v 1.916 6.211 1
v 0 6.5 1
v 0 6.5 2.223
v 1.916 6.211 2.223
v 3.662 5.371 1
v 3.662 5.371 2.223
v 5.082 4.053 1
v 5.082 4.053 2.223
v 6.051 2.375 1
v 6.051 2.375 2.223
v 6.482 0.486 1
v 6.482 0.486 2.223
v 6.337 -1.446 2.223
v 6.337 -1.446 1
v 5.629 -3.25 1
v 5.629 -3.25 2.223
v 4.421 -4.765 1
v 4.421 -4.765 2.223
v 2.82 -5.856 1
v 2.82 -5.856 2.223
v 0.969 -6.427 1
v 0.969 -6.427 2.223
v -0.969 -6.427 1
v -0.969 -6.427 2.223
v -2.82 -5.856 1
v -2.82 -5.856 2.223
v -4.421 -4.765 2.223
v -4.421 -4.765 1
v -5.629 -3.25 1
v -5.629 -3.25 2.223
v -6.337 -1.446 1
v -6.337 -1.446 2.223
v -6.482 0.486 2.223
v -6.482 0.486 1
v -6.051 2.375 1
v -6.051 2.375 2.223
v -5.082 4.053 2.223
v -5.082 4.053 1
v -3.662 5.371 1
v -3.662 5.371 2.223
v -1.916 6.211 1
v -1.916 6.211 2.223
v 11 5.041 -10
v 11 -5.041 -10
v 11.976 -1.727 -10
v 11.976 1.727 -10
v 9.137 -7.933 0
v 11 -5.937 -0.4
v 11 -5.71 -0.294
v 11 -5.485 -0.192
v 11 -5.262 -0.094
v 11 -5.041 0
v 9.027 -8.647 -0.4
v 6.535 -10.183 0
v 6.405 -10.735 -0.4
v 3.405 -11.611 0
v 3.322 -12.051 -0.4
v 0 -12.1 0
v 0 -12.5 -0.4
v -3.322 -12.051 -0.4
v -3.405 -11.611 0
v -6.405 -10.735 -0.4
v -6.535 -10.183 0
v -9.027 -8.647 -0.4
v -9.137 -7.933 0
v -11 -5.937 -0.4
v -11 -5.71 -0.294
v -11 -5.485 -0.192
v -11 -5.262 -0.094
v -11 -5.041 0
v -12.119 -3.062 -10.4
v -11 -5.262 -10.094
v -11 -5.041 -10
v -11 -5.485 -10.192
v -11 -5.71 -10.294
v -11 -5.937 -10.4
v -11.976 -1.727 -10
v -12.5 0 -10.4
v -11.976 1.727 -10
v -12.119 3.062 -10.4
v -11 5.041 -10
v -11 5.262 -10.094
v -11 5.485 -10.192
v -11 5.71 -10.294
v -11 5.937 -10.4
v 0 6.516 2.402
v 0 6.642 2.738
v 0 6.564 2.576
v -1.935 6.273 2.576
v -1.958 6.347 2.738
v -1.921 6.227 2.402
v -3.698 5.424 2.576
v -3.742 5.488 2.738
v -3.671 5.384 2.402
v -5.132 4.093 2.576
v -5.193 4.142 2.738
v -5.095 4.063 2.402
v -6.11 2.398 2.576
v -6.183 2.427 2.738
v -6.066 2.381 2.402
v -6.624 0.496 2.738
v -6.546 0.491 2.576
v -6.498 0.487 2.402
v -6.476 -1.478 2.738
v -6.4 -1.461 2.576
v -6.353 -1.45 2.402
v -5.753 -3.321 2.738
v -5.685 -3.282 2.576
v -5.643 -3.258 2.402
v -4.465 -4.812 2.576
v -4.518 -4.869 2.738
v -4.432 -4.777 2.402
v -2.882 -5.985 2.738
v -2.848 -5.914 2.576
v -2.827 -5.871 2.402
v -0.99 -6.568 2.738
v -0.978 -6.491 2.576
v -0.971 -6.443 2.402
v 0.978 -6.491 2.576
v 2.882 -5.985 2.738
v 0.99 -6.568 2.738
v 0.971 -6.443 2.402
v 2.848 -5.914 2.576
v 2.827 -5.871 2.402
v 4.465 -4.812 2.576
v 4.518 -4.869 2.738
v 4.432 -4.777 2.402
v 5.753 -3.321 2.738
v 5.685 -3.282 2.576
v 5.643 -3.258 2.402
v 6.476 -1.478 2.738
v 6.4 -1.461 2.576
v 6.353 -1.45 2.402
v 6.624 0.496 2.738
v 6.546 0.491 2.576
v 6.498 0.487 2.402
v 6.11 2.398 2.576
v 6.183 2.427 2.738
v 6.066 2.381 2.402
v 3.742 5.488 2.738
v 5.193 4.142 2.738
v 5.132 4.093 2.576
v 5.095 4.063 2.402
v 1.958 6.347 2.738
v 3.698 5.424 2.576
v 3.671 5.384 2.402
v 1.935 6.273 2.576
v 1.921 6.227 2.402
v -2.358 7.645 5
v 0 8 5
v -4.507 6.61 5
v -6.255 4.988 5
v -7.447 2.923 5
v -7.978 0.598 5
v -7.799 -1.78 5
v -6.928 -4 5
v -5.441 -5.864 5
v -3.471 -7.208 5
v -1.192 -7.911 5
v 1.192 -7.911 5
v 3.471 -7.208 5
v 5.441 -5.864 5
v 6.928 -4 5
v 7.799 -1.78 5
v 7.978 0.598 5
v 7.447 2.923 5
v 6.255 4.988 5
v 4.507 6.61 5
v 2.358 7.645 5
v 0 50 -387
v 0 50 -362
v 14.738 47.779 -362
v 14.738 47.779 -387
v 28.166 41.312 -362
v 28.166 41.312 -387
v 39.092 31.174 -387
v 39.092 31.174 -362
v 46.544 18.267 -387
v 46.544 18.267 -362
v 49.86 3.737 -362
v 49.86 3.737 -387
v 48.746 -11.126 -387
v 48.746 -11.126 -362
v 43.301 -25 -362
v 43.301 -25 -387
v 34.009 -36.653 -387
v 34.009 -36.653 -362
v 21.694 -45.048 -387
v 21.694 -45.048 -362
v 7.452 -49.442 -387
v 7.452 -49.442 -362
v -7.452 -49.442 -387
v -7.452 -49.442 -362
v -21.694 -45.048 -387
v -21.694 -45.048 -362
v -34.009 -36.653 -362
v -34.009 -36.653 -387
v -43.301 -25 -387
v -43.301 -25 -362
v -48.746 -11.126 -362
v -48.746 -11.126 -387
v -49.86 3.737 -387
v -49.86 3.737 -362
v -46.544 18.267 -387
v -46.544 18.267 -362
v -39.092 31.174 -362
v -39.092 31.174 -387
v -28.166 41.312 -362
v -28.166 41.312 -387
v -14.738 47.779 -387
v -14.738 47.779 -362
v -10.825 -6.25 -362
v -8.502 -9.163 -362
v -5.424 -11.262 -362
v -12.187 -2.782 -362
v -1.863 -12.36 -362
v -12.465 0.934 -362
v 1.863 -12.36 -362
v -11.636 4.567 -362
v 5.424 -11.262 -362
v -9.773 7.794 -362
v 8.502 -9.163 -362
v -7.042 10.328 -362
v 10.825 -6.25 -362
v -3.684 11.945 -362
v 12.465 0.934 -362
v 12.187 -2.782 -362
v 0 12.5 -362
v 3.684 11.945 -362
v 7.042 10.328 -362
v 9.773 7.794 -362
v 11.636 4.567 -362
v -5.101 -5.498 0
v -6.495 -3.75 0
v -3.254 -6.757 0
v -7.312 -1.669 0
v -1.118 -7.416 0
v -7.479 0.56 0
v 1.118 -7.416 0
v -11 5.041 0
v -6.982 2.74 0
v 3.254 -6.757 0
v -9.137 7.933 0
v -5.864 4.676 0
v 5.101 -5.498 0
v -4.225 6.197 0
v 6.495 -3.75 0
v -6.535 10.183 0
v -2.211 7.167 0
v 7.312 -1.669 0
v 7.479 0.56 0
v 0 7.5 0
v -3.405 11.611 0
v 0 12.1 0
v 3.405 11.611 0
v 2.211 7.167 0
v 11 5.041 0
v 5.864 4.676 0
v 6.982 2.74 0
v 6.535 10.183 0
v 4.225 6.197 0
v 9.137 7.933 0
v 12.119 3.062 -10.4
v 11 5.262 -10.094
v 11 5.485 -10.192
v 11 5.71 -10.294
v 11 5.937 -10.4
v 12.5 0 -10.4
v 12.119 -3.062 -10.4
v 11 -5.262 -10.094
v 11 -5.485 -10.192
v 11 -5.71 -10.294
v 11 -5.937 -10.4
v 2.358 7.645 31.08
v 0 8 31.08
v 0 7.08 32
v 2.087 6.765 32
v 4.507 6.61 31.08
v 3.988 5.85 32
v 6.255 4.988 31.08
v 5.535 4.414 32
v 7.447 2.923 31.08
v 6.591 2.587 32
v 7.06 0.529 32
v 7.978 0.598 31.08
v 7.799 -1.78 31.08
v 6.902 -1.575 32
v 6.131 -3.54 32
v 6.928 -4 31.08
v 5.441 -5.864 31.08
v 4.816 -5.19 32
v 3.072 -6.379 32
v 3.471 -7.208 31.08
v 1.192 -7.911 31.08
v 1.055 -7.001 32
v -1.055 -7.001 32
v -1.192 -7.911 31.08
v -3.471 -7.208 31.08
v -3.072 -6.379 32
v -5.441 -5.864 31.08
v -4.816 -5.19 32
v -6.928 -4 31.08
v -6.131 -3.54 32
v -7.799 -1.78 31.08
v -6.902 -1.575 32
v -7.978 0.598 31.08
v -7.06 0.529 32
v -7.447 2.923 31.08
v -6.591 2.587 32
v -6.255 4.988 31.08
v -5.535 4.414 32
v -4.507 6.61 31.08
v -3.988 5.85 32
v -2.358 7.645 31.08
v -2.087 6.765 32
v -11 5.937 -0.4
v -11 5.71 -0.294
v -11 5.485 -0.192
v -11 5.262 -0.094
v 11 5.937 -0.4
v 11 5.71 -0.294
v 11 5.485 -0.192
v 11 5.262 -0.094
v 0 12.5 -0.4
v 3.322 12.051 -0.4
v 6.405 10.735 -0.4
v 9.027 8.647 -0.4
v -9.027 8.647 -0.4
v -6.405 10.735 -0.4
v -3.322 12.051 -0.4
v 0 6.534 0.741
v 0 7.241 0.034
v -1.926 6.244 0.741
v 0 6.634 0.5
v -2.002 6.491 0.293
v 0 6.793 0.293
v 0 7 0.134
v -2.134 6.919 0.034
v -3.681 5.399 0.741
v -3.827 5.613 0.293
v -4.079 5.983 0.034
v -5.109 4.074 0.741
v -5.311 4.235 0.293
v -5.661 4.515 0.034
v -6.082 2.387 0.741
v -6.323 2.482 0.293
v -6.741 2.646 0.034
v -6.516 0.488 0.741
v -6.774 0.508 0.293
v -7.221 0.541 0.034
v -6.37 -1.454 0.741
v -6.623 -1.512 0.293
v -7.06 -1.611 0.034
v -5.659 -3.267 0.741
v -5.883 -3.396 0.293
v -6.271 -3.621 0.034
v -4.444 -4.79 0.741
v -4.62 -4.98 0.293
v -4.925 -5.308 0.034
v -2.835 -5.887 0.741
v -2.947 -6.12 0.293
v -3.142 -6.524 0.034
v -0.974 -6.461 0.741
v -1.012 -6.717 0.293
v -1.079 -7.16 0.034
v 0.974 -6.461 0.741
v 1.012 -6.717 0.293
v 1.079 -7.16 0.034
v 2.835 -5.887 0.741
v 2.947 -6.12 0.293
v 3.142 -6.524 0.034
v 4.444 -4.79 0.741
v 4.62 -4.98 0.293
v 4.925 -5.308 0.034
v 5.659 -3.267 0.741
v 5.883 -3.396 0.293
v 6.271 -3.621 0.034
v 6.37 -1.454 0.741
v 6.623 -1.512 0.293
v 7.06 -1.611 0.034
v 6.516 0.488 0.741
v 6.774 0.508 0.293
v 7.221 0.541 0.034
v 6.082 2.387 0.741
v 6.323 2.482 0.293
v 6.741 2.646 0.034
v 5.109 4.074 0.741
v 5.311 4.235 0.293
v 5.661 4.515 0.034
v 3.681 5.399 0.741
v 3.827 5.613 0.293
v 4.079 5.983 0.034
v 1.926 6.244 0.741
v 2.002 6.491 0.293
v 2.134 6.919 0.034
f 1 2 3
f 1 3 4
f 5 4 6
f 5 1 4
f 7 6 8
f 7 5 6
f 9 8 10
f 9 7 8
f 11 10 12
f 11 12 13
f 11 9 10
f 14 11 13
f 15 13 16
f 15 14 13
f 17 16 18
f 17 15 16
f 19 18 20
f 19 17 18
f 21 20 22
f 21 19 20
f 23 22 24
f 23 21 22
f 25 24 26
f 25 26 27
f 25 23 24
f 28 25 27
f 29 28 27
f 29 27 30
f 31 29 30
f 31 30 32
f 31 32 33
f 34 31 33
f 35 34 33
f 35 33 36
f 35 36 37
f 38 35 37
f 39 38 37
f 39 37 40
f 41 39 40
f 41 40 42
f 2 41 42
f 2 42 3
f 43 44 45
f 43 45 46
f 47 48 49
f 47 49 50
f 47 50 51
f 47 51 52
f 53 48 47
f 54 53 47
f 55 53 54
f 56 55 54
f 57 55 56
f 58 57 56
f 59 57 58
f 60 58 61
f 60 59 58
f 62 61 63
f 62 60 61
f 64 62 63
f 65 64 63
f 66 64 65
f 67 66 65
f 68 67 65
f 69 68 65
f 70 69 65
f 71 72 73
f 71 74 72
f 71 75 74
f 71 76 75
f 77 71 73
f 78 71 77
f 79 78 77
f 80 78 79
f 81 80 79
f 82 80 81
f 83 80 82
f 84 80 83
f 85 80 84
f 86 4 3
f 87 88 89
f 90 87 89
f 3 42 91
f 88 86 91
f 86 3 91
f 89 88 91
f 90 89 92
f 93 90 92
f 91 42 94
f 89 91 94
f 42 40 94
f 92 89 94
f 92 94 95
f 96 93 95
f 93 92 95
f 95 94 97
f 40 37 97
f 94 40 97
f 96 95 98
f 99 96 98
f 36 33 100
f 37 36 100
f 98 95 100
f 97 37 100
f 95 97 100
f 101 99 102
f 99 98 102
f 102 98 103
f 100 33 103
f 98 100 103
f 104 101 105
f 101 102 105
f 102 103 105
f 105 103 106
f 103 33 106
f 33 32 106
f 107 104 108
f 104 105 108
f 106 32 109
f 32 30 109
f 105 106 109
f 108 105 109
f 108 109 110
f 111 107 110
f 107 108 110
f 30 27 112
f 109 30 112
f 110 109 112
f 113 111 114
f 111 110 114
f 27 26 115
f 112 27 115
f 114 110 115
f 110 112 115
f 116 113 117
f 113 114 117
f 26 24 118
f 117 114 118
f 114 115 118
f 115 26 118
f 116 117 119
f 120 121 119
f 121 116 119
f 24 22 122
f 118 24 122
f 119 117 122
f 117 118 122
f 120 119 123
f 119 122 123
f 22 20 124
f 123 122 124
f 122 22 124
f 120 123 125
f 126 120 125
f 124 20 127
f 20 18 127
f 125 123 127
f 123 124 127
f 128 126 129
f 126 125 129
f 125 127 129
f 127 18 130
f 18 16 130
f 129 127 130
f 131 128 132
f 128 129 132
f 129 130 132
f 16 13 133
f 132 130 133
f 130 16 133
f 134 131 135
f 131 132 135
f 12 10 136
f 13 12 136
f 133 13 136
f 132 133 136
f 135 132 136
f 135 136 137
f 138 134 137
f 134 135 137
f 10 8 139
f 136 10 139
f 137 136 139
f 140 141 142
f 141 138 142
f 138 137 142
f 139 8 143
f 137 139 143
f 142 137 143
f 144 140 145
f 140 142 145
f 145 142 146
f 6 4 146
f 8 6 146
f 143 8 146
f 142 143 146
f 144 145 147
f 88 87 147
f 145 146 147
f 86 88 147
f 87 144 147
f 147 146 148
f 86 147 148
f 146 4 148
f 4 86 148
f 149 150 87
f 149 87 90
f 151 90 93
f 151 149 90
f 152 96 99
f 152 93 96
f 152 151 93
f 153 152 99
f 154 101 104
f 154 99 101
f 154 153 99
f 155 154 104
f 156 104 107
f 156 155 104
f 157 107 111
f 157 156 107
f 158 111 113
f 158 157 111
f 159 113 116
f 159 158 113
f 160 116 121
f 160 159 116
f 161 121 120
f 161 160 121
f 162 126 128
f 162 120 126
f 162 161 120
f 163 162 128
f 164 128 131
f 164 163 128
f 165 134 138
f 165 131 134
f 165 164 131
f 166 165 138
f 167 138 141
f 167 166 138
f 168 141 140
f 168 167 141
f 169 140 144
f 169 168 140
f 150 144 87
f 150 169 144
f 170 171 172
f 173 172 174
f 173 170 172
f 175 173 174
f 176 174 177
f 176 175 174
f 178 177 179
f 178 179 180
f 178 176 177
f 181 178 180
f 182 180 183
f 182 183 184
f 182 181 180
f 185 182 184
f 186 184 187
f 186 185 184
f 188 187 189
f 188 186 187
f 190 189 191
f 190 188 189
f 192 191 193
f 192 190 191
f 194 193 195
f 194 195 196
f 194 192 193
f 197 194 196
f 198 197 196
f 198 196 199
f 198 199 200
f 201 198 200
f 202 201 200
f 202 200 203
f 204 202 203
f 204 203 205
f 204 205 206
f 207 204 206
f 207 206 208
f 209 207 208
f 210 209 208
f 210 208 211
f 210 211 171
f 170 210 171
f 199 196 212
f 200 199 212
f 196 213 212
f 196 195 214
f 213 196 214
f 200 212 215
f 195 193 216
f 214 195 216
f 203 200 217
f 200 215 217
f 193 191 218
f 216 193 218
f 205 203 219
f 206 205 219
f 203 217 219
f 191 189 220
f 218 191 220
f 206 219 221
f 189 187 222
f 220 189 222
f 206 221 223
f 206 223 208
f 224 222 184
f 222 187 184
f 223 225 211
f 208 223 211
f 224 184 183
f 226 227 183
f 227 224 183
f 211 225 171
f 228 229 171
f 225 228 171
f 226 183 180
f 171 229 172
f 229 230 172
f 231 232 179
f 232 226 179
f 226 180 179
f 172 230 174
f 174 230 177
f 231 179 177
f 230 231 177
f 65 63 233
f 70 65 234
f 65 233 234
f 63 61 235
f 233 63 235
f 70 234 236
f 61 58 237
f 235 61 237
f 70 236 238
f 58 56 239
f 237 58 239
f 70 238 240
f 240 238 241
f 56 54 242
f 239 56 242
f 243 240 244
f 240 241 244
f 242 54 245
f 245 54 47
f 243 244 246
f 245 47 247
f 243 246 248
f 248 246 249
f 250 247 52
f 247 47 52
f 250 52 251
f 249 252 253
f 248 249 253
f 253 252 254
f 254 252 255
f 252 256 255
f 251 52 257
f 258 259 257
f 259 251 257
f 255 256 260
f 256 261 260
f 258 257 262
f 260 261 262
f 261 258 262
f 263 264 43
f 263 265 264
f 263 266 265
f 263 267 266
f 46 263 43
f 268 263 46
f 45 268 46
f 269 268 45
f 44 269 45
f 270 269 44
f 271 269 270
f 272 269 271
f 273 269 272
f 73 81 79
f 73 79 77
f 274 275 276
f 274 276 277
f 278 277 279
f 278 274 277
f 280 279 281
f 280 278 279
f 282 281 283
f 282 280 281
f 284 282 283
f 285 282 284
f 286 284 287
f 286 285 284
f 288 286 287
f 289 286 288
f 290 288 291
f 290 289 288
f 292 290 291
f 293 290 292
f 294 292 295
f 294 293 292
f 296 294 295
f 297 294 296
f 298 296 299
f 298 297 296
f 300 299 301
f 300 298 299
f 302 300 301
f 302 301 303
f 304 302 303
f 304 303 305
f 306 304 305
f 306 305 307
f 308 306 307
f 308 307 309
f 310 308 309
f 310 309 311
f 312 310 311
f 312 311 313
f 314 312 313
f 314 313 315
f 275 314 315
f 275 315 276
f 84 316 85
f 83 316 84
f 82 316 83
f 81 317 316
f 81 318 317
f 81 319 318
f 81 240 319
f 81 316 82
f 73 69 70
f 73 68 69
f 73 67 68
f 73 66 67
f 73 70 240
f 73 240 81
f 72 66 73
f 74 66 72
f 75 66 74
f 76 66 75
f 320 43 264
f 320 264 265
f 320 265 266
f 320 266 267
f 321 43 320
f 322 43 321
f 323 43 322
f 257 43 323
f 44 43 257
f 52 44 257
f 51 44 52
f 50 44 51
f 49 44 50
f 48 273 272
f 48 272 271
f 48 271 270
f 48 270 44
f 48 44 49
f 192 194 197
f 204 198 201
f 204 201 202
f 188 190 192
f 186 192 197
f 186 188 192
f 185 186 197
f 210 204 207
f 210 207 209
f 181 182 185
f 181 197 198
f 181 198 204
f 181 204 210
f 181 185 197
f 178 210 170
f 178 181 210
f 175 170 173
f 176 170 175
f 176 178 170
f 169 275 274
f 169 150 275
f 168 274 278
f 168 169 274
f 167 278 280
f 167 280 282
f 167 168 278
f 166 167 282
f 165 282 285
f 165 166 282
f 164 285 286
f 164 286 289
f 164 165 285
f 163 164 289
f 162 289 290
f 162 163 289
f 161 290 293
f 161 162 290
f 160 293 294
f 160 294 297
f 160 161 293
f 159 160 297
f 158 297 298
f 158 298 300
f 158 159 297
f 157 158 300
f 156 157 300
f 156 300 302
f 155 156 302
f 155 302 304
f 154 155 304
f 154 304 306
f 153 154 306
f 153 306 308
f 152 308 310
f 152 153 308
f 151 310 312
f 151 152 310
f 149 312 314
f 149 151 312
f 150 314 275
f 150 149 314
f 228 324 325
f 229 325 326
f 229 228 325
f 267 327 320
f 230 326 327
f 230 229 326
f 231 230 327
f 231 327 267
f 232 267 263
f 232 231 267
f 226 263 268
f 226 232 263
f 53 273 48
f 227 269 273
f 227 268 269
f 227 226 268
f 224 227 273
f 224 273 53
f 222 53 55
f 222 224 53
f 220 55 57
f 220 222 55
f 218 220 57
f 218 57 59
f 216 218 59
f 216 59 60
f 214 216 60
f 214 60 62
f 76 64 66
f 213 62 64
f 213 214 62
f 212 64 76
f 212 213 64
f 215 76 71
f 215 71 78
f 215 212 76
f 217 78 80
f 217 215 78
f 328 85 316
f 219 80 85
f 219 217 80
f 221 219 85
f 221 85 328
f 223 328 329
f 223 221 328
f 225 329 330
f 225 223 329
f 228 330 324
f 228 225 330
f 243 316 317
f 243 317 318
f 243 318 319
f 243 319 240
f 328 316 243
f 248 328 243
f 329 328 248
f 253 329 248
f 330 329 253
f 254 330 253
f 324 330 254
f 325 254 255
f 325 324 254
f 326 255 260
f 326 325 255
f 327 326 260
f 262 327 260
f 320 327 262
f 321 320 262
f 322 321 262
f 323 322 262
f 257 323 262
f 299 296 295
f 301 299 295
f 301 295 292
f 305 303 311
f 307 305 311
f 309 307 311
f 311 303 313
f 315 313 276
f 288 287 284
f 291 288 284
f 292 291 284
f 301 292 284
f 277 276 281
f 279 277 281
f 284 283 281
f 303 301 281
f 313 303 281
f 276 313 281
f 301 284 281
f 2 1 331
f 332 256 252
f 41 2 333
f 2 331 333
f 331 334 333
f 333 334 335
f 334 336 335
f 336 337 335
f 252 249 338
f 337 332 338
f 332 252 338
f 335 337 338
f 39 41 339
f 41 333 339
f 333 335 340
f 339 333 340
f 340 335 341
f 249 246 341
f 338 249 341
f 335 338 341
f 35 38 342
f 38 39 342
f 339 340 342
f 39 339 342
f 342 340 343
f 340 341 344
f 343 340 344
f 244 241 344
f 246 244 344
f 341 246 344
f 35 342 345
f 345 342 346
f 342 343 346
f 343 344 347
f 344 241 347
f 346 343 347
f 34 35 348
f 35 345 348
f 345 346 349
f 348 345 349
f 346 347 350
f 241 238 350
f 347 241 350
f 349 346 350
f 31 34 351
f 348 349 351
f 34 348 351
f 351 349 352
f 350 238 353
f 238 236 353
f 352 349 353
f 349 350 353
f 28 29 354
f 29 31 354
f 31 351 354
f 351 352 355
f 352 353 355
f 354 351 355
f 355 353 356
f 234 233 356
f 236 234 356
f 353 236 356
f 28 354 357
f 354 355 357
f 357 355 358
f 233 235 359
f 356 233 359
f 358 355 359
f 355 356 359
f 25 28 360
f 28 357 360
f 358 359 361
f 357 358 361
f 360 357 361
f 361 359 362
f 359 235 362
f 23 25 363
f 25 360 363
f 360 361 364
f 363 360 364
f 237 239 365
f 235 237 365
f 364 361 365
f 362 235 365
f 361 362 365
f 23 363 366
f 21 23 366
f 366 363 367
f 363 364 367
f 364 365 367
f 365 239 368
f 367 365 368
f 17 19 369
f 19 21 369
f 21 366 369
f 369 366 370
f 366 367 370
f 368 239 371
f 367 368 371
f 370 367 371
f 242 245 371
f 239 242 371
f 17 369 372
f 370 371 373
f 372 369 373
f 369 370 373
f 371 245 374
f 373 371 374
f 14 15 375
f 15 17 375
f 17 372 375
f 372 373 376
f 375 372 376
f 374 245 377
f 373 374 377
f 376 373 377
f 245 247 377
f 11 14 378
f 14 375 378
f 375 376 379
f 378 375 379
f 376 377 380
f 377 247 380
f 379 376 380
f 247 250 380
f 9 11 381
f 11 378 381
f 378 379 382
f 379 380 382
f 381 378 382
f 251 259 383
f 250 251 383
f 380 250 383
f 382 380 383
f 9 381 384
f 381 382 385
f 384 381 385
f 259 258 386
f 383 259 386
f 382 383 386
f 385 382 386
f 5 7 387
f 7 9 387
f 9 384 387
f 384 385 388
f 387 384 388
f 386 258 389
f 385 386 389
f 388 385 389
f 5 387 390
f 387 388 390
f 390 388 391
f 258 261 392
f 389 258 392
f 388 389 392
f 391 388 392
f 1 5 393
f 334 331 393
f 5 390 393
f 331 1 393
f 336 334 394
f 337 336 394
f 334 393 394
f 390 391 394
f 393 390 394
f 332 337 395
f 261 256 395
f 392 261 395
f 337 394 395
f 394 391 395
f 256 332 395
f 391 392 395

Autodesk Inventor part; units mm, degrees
sketch "Sketch_1" plane through (0, 0, 0) normal (1, 0, 0) x (0, 1, 0)
  line L0 (0, -387) -> (0, 0)
  line L1 (0, 0) -> (12.1, 0)
  line L2 (12.1, 0) -> (12.5, -0.4)
  line L3 (12.5, -0.4) -> (12.5, -362)
  line L4 (12.5, -362) -> (50, -362)
  line L5 (50, -362) -> (50, -387)
  line L6 (50, -387) -> (0, -387)
  line L7 (0, -387) -> (0, 0)
revolve "Revolution1" add sketch "Sketch_1" angle 360 about axis through (0, 0, -387) along (0, 0, -1)
sketch "Sketch_2" plane through (0, 0, 0) normal (1, 0, 0) x (0, 1, 0)
  line L0 (0, -1) -> (0, 32)
  line L1 (0, 32) -> (7.08, 32)
  line L2 (7.08, 32) -> (8, 31.08)
  line L3 (8, 31.08) -> (8, 5)
  line L4 (8, 5) -> (6.6425, 2.7375)
  arc A0 (6.6425, 2.7375) -> (6.5, 2.223) centre (7.5, 2.223) ccw
  line L5 (6.5, 2.223) -> (6.5, 1)
  arc A1 (6.5, 1) -> (7.5, 0) centre (7.5, 1) ccw
  line L6 (7.5, 0) -> (8, 0)
  line L7 (8, 0) -> (8, -1)
  line L8 (8, -1) -> (0, -1)
  line L9 (0, -1) -> (0, 32)
revolve "Revolution2" add sketch "Sketch_2" angle 360 about axis through (0, 0, -1) along (0, 0, -1)
thread "Thread1" size "M16x1.5" class "6g" standard "ISO Metric profile" full length
sketch "Sketch_4" plane through (0, 0, 0) normal (0, 1, 0) x (-1, 0, 0)
  line L0 (15.5, -10.4) -> (15.5, 36.6)
  line L1 (15.5, 36.6) -> (-15.5, 36.6)
  line L2 (-15.5, 36.6) -> (-15.5, -10.4)
  line L3 (-15.5, -10.4) -> (-11, -10.4)
  line L4 (-11, -10.4) -> (-11, 0)
  line L5 (-11, 0) -> (-14.5, 0)
  line L6 (-14.5, 0) -> (-14.5, 35.6)
  line L7 (-14.5, 35.6) -> (14.5, 35.6)
  line L8 (14.5, 35.6) -> (14.5, 0)
  line L9 (14.5, 0) -> (11, 0)
  line L10 (11, 0) -> (11, -10.4)
  line L11 (11, -10.4) -> (15.5, -10.4)
extrude "Extrusion1" cut sketch "Sketch_4" along normal mid plane 25
sketch "Sketch_5" plane through (0, 0, 0) normal (0, 1, 0) x (-1, 0, 0)
  line L0 (0, -10) -> (0, -10.4)
  line L1 (0, -10.4) -> (-12.5, -10.4)
  line L2 (-12.5, -10.4) -> (-12.1, -10)
  line L3 (-12.1, -10) -> (0, -10)
  line L4 (0, -10) -> (0, -10.4)
revolve "Revolution3" add sketch "Sketch_5" angle 360 about axis through (0, 0, -10) along (0, 0, 1)
ref_plane "KOLBEN_XY" through (0, 0, -387) normal (0, 0, -1) x (1, 0, 0)
ref_plane "KOLBEN_YZ" through (0, 0, -387) normal (1, 0, 0) x (0, -1, 0)
ref_plane "KOLBEN_ZX" through (0, 0, -387) normal (0, -1, 0) x (0, 0, -1)
properties part number "1808236 DFPI-100-280-ND2P-E-P(K)"
